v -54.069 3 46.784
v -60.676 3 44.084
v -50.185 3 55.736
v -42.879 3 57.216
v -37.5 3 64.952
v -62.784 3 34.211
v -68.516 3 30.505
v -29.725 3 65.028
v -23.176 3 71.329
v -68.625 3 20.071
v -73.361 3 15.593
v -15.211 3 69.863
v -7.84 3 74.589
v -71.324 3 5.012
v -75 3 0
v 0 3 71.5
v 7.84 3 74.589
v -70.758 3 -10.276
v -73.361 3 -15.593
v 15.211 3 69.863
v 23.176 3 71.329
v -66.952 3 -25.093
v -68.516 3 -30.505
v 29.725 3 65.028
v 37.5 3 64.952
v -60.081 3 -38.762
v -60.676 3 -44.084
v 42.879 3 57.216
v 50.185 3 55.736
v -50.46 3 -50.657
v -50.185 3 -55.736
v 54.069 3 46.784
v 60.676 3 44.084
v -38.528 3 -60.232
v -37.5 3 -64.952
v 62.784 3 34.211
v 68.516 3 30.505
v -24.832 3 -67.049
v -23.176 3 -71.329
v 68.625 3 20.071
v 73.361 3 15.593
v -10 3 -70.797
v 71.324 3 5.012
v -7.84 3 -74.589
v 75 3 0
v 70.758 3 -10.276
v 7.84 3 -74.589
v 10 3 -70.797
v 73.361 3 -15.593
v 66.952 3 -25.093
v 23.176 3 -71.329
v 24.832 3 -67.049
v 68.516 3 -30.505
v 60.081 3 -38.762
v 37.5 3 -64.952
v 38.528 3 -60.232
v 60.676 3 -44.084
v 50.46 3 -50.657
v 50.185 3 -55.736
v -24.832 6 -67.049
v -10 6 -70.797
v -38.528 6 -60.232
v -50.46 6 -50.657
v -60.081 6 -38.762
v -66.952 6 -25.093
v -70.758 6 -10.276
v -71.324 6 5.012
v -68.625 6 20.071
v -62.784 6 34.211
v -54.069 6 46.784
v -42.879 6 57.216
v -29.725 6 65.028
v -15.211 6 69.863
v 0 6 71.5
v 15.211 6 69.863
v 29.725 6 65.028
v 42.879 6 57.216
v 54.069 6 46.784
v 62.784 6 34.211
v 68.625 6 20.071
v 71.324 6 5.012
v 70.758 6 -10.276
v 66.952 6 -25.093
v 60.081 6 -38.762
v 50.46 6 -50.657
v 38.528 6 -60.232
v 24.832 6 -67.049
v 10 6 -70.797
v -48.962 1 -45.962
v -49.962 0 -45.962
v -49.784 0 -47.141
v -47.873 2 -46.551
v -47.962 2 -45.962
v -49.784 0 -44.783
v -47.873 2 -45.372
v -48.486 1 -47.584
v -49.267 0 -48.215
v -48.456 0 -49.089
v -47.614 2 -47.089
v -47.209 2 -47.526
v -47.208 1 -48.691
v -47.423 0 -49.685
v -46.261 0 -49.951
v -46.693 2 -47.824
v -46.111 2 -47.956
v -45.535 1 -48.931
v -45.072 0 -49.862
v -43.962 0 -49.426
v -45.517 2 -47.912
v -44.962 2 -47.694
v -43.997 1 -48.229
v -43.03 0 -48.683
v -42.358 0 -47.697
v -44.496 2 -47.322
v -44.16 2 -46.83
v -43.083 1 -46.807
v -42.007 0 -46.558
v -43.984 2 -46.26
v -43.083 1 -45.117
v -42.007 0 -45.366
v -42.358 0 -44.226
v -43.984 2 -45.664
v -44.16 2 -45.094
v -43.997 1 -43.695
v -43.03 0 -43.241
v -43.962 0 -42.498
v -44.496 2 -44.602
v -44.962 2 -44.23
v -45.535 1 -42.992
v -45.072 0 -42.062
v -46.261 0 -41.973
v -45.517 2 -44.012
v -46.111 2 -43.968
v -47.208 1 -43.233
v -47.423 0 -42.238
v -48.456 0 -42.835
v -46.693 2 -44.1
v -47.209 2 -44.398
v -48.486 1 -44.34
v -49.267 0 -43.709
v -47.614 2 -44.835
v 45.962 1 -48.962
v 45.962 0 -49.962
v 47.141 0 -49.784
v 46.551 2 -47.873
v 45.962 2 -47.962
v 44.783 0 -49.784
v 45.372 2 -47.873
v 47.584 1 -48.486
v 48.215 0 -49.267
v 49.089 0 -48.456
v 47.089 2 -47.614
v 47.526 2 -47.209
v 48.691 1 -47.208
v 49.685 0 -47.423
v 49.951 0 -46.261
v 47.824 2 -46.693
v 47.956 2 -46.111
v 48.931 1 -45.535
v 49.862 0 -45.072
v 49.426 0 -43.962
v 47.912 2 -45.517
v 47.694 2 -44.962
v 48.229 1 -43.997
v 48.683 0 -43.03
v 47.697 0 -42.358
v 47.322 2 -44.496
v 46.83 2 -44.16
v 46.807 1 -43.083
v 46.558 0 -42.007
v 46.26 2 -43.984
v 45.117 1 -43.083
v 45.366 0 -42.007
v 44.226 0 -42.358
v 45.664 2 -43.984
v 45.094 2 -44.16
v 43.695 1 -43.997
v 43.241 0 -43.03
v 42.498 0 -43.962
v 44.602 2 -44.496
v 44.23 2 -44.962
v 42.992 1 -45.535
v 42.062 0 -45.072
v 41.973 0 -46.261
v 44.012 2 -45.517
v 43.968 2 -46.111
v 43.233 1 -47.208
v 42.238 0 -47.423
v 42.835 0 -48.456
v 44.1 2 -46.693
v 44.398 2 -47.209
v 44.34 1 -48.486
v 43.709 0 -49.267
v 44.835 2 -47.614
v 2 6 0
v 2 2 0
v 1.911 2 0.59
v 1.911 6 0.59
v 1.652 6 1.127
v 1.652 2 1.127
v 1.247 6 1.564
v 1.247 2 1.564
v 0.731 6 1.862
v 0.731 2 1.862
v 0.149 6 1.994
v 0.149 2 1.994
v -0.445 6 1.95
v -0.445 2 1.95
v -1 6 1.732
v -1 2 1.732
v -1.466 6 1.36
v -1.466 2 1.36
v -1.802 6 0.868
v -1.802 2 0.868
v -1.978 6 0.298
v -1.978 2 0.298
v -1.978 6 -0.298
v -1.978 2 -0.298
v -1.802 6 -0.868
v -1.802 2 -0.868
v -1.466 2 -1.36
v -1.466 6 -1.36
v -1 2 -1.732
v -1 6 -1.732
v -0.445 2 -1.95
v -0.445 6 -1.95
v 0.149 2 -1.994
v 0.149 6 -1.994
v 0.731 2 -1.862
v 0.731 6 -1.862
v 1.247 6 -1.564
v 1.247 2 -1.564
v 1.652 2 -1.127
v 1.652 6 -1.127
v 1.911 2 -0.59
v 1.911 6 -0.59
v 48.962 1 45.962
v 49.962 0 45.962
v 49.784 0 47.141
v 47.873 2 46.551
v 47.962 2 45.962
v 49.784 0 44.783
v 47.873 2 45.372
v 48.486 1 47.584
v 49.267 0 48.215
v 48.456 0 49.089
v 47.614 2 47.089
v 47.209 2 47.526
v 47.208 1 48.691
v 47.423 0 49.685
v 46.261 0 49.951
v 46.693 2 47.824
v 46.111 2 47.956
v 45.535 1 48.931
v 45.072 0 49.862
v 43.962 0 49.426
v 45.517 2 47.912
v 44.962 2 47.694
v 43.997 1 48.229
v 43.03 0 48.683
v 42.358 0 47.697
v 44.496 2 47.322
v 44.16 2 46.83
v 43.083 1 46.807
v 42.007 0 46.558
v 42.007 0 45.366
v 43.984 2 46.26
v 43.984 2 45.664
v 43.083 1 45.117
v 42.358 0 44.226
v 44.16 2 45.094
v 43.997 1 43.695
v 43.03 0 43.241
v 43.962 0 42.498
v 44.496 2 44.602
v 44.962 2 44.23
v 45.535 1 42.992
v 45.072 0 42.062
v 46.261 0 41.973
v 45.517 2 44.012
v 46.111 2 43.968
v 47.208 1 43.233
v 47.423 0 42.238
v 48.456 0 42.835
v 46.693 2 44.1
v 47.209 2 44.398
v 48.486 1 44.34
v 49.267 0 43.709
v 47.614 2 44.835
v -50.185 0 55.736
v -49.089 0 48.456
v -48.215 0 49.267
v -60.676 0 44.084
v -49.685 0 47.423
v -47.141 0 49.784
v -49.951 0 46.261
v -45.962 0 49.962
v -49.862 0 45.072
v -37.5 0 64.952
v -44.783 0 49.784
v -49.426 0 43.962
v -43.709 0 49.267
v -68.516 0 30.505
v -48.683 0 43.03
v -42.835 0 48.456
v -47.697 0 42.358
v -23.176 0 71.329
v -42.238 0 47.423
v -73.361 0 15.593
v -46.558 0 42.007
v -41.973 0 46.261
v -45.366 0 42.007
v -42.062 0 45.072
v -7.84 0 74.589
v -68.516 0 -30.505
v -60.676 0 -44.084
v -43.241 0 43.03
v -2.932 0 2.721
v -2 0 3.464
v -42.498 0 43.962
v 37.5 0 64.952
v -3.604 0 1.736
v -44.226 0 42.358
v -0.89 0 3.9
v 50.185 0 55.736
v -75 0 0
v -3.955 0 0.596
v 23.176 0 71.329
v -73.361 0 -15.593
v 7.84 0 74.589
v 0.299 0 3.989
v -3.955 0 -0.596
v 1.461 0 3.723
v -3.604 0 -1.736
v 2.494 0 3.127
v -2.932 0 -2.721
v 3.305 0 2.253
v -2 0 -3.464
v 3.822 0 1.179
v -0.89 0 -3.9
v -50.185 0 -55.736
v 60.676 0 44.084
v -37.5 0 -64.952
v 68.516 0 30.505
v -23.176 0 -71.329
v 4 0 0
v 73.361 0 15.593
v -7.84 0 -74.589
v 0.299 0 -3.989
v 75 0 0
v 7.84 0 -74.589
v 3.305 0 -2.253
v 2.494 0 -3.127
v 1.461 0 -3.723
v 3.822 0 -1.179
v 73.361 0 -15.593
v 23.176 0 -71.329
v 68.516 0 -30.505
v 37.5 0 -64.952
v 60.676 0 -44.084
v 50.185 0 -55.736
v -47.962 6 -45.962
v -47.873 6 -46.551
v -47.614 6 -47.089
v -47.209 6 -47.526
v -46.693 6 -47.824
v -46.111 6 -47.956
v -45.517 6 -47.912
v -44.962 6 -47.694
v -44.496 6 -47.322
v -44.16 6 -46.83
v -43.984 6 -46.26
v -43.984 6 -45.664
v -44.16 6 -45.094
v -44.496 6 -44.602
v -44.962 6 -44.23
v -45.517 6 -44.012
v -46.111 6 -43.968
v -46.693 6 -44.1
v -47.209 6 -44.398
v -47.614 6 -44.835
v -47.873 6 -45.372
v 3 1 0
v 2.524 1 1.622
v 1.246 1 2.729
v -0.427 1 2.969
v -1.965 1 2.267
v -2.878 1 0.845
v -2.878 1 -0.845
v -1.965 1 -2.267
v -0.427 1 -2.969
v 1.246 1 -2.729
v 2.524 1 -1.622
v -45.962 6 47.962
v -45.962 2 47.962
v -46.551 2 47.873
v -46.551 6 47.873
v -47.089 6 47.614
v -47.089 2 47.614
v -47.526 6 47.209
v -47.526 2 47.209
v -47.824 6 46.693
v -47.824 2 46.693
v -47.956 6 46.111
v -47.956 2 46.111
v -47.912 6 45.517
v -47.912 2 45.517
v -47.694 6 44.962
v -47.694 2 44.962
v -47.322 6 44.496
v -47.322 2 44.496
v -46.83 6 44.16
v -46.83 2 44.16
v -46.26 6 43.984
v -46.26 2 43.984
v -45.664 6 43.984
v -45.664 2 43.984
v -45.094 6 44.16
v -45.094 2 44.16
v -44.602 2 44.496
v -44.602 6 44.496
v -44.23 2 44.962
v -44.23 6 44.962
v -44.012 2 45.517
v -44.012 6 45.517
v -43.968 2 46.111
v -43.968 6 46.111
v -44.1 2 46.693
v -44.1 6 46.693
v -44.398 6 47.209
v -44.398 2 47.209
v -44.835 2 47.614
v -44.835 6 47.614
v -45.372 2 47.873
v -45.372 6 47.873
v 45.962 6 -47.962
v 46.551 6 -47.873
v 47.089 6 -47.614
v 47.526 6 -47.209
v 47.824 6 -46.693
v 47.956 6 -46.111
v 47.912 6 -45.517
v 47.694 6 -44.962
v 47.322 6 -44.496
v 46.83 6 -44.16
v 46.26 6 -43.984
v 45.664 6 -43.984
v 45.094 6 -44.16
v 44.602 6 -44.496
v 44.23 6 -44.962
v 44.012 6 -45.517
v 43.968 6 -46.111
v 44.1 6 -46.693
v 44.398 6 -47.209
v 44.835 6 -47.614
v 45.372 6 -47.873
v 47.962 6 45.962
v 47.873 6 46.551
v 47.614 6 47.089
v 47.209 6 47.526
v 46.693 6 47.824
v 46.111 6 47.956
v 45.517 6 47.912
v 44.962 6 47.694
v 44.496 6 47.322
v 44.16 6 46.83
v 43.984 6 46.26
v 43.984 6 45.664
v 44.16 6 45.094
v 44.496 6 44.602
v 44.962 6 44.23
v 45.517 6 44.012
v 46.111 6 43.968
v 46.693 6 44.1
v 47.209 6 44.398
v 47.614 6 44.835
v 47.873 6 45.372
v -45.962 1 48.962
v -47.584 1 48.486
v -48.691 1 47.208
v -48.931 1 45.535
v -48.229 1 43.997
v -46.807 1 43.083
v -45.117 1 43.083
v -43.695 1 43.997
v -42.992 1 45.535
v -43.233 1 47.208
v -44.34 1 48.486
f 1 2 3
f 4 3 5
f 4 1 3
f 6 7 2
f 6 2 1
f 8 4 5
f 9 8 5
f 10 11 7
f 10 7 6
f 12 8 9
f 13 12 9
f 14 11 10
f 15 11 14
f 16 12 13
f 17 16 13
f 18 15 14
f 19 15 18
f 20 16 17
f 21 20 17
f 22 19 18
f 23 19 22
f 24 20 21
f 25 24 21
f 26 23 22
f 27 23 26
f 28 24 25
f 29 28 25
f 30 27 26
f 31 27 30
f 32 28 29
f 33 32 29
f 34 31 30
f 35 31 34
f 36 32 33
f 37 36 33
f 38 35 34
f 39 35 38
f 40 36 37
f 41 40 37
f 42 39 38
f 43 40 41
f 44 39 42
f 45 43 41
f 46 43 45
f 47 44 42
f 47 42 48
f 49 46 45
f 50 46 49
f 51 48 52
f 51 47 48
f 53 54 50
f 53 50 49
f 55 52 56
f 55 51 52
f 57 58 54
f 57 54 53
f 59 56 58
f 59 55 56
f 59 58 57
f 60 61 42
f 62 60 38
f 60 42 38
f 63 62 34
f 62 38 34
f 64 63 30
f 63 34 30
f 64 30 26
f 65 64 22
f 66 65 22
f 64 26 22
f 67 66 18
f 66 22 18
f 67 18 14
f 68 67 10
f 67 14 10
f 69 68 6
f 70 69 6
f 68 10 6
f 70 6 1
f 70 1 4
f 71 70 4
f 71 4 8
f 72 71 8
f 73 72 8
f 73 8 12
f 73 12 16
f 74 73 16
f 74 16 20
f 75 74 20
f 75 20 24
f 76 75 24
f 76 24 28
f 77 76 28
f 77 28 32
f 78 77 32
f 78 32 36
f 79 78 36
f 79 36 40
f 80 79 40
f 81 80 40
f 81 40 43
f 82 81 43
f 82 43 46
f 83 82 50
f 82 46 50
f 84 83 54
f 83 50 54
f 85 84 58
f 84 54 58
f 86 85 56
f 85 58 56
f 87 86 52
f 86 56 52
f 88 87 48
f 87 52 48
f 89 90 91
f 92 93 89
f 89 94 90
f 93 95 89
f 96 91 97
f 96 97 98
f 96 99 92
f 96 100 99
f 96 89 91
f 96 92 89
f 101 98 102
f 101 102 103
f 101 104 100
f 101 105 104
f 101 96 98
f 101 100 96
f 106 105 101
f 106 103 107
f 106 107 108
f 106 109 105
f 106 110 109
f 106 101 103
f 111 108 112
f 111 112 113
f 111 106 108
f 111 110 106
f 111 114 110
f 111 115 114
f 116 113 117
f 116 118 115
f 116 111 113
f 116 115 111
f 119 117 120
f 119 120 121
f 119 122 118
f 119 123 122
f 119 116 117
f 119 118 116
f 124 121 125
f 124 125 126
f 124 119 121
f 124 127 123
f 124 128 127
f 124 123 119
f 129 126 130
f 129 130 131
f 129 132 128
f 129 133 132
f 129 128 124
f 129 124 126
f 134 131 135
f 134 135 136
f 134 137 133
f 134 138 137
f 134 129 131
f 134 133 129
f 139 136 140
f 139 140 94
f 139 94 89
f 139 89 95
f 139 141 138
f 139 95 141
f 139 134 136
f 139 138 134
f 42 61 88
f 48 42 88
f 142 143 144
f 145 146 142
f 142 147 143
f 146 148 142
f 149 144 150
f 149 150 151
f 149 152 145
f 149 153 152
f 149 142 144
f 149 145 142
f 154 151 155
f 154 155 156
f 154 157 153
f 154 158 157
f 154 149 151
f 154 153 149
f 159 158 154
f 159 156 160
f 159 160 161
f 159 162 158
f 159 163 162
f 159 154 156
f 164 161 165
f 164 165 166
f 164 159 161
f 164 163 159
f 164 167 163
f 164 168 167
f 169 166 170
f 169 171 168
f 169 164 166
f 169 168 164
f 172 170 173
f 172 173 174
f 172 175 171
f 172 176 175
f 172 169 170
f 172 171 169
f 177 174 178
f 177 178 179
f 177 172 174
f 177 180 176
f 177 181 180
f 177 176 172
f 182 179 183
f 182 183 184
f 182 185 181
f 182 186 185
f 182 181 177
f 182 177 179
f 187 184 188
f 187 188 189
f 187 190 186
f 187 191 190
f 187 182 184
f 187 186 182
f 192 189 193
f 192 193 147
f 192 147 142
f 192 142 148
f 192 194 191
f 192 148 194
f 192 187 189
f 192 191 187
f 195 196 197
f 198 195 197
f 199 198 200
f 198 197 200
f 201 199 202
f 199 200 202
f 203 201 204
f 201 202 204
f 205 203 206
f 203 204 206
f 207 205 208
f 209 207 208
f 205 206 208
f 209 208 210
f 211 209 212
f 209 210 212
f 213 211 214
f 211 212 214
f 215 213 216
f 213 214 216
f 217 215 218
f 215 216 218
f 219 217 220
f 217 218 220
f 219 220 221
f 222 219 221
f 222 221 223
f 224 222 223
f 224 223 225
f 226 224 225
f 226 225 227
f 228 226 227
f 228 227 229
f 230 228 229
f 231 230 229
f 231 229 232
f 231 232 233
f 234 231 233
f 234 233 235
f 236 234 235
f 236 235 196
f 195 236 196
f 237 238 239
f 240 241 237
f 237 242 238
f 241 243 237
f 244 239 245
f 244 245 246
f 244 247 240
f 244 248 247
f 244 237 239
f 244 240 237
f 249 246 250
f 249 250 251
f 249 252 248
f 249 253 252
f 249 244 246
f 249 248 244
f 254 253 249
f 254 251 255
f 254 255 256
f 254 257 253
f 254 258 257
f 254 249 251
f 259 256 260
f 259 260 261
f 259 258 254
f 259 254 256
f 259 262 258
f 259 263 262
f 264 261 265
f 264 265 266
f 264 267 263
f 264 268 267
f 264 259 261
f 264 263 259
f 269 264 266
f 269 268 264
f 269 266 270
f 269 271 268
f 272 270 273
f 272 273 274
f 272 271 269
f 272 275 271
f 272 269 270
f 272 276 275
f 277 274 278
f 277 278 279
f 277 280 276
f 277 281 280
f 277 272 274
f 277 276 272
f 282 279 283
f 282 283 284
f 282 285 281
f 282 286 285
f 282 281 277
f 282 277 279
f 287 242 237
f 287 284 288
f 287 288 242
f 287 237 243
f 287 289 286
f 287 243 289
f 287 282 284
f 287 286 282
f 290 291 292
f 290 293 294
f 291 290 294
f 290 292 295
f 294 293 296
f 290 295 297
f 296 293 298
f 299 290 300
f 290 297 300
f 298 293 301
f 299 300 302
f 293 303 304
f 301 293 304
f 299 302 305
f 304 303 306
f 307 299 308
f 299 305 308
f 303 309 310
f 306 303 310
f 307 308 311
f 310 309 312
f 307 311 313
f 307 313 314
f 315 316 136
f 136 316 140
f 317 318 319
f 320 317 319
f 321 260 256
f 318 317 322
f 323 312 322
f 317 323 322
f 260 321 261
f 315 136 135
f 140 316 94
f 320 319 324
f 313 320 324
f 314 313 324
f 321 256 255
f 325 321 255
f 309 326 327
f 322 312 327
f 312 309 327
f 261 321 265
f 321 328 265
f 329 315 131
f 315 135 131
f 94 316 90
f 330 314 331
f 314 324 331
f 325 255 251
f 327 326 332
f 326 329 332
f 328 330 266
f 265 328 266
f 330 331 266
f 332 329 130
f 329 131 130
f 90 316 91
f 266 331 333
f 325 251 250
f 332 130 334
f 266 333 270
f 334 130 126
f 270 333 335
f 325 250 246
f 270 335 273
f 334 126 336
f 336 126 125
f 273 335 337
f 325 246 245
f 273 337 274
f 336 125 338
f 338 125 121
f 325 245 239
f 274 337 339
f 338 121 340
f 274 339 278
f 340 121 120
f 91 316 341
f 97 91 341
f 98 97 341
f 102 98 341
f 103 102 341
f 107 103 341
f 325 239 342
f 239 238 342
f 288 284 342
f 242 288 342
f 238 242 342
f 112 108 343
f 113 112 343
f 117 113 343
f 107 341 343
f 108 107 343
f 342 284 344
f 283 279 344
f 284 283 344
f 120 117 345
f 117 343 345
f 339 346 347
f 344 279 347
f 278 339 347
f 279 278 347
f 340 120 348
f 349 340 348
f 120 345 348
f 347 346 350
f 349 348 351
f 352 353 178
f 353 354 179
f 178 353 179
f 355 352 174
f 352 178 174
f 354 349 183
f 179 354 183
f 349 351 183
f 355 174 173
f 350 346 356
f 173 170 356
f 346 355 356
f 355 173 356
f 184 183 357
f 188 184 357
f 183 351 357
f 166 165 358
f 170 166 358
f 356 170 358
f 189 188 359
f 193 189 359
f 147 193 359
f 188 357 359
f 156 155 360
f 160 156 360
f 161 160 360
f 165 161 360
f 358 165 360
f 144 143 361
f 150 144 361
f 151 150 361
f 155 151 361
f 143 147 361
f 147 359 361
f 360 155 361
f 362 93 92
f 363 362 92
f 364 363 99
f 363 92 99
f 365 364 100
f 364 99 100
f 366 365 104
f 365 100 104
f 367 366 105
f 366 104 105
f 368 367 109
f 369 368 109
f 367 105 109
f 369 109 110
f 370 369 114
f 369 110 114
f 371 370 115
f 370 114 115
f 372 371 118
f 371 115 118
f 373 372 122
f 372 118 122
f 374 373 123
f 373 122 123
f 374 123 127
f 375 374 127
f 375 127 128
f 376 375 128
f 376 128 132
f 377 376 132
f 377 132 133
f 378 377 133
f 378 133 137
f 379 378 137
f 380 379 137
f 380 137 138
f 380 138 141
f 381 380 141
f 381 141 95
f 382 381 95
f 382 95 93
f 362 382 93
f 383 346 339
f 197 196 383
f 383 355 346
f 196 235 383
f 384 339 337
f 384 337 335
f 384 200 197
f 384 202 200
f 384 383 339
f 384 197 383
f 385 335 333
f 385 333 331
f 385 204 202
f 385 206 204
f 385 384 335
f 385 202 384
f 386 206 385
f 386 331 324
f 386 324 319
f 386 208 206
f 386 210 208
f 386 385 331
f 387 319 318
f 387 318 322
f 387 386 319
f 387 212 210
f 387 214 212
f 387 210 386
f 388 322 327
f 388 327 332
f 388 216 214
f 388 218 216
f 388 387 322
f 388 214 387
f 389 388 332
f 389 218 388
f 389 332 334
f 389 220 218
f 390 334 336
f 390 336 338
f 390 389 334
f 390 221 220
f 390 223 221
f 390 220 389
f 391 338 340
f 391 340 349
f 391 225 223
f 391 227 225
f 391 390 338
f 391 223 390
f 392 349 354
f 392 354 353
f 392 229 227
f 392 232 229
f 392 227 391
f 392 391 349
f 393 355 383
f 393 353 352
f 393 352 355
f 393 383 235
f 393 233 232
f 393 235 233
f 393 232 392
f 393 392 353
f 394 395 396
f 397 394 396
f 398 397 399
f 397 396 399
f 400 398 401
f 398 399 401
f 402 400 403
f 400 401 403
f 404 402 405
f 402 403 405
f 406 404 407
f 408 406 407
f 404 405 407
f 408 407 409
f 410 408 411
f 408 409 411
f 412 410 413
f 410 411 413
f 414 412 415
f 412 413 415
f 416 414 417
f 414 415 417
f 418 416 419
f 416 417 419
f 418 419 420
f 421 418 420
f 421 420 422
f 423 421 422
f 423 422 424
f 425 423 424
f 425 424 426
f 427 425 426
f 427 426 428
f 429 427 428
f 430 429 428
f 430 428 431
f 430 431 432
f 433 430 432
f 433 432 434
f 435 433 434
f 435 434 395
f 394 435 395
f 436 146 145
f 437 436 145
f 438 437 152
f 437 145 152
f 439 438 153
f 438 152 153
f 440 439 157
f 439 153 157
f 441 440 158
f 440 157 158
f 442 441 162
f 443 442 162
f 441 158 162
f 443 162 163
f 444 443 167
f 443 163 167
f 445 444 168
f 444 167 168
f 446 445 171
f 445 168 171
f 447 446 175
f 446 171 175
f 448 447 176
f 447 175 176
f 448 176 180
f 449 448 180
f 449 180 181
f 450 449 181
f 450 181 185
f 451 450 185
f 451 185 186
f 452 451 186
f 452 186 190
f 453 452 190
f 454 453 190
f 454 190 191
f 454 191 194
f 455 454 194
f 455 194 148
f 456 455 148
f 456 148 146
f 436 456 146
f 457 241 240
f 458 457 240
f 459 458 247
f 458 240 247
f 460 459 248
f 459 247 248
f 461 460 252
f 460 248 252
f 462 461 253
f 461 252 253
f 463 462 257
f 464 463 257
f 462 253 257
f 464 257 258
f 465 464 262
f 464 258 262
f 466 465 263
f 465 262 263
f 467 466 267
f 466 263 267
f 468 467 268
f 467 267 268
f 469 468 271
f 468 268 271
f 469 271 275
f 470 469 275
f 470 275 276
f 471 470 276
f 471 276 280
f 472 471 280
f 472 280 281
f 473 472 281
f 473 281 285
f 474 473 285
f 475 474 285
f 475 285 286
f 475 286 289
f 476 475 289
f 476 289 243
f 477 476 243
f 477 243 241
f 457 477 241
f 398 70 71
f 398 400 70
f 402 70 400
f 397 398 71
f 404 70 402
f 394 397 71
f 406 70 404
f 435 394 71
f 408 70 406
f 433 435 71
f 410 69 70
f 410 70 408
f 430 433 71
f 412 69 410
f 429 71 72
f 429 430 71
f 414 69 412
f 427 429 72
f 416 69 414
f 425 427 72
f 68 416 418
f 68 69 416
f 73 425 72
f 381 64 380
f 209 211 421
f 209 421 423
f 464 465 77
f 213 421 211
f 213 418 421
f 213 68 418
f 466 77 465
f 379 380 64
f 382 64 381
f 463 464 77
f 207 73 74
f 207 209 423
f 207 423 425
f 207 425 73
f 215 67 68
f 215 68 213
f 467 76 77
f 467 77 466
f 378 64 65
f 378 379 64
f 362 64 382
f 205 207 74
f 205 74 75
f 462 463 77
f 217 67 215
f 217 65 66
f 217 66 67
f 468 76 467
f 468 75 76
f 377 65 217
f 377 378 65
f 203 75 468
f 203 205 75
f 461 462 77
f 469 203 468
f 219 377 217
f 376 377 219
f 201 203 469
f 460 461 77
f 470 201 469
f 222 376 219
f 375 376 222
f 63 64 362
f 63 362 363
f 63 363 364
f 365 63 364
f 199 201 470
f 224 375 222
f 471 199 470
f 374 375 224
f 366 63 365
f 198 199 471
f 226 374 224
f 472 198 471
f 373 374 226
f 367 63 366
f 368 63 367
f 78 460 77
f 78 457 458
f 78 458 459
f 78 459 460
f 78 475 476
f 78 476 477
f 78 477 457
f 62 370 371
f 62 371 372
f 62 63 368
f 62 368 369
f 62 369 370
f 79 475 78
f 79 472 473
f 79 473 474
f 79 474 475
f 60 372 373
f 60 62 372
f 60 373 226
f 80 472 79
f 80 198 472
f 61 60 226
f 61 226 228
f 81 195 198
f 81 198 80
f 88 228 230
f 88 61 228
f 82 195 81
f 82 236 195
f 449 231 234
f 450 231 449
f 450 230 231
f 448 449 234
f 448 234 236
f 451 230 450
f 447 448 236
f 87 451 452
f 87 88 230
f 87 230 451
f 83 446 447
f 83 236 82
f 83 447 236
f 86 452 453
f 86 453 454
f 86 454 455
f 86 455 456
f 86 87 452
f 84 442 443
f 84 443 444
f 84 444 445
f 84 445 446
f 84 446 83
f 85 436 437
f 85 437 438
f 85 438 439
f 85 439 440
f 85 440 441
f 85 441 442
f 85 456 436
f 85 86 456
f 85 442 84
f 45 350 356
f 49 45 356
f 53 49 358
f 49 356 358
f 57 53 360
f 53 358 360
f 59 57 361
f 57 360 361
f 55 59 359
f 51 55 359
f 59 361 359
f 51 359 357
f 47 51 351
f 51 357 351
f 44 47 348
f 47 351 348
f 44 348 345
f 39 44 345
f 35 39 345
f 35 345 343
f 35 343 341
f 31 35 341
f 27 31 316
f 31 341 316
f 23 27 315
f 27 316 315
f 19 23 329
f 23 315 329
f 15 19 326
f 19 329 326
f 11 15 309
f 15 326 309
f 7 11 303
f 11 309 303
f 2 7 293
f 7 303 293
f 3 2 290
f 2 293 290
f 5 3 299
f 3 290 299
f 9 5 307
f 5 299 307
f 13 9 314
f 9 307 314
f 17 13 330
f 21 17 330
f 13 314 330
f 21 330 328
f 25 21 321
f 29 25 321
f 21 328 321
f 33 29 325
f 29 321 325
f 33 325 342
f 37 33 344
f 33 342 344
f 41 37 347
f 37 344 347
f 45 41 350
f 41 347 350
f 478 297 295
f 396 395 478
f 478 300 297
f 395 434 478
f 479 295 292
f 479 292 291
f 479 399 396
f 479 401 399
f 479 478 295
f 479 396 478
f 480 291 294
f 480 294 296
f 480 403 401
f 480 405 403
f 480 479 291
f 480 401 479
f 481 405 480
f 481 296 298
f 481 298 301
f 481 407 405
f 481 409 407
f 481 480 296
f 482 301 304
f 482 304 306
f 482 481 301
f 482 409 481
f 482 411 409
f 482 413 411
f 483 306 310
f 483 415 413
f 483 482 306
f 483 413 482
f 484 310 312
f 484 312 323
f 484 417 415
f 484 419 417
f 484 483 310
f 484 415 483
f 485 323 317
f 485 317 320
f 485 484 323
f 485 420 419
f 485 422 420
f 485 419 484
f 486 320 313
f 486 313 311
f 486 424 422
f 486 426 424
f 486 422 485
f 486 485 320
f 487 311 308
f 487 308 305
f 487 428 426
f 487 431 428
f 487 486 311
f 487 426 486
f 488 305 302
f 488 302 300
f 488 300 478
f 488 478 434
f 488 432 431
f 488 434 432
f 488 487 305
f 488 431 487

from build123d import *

# Parameters (mm, degrees)
SKETCH1_R                    = 75
BOSS_EXTRUDE1_DEPTH          = 3
SKETCH2_R                    = 71.5
BOSS_EXTRUDE2_DEPTH          = 3
SKETCH3_R                    = 2
CUT_EXTRUDE1_DEPTH           = 7
CHAMFER1_SIZE                = 2
CIRPATTERN1_COUNT            = 4
CHAMFER1_OF_CIRPATTERN1_SIZE = 2
SKETCH4_R                    = 2
CUT_EXTRUDE2_DEPTH           = 7
CHAMFER2_SIZE                = 2
CUT_EXTRUDE4_DEPTH           = 3


with BuildPart() as part:
    # Sketch1 → Boss-Extrude1 (new body)
    with BuildSketch(Plane(origin=(0, 0, 0), x_dir=(1, 0, 0), z_dir=(0, 1, 0))):
        Circle(SKETCH1_R)
    extrude(amount=BOSS_EXTRUDE1_DEPTH)

    # Sketch2 → Boss-Extrude2 (add)
    with BuildSketch(Plane(origin=(0, 3, 0), x_dir=(1, 0, 0), z_dir=(0, 1, 0))):
        Circle(SKETCH2_R)
    extrude(amount=BOSS_EXTRUDE2_DEPTH)

    # Sketch3 → Cut-Extrude1 (cut, through all)
    with BuildSketch(Plane.XZ):
        with Locations((45.961940777, 45.961940777)):
            Circle(SKETCH3_R)
    cut_extrude1 = extrude(amount=-CUT_EXTRUDE1_DEPTH, mode=Mode.SUBTRACT)

    # Chamfer1
    chamfer1_edges = [part.edges().sort_by_distance(p)[0] for p in [
        (43.961940777, 0, 45.961940777),
    ]]
    chamfer(chamfer1_edges, length=CHAMFER1_SIZE)

    # CirPattern1: Cut-Extrude1 ×4 about axis
    cirpattern1_axis = Axis((0, 0, 0), (0, 1, 0))
    for i in range(1, CIRPATTERN1_COUNT):
        add(cut_extrude1.rotate(cirpattern1_axis, i * 360 / CIRPATTERN1_COUNT), mode=Mode.SUBTRACT)

    # Chamfer1 of CirPattern1
    chamfer1_of_cirpattern1_edges = [part.edges().sort_by_distance(p)[0] for p in [
        (45.961940777, 0, -43.961940777),
        (-43.961940777, 0, -45.961940777),
        (-45.961940777, 0, 43.961940777),
    ]]
    chamfer(chamfer1_of_cirpattern1_edges, length=CHAMFER1_OF_CIRPATTERN1_SIZE)

    # Sketch4 → Cut-Extrude2 (cut, through all)
    with BuildSketch(Plane.XZ):
        Circle(SKETCH4_R)
    extrude(amount=-CUT_EXTRUDE2_DEPTH, mode=Mode.SUBTRACT)

    # Chamfer2
    chamfer2_edges = [part.edges().sort_by_distance(p)[0] for p in [
        (-2, 0, 0),
    ]]
    chamfer(chamfer2_edges, length=CHAMFER2_SIZE)

    # Sketch5 → Cut-Extrude4 (cut)
    with BuildSketch(Plane(origin=(0, 6, 0), x_dir=(1, 0, 0), z_dir=(0, 1, 0))):
        with BuildLine():
            Line((-10, 70.797245709), (10, 70.797245709))
            ThreePointArc((10, 70.797245709), (0, 71.5), (-10, 70.797245709))
        make_face()
    extrude(amount=-CUT_EXTRUDE4_DEPTH, mode=Mode.SUBTRACT)


solid = part.part
